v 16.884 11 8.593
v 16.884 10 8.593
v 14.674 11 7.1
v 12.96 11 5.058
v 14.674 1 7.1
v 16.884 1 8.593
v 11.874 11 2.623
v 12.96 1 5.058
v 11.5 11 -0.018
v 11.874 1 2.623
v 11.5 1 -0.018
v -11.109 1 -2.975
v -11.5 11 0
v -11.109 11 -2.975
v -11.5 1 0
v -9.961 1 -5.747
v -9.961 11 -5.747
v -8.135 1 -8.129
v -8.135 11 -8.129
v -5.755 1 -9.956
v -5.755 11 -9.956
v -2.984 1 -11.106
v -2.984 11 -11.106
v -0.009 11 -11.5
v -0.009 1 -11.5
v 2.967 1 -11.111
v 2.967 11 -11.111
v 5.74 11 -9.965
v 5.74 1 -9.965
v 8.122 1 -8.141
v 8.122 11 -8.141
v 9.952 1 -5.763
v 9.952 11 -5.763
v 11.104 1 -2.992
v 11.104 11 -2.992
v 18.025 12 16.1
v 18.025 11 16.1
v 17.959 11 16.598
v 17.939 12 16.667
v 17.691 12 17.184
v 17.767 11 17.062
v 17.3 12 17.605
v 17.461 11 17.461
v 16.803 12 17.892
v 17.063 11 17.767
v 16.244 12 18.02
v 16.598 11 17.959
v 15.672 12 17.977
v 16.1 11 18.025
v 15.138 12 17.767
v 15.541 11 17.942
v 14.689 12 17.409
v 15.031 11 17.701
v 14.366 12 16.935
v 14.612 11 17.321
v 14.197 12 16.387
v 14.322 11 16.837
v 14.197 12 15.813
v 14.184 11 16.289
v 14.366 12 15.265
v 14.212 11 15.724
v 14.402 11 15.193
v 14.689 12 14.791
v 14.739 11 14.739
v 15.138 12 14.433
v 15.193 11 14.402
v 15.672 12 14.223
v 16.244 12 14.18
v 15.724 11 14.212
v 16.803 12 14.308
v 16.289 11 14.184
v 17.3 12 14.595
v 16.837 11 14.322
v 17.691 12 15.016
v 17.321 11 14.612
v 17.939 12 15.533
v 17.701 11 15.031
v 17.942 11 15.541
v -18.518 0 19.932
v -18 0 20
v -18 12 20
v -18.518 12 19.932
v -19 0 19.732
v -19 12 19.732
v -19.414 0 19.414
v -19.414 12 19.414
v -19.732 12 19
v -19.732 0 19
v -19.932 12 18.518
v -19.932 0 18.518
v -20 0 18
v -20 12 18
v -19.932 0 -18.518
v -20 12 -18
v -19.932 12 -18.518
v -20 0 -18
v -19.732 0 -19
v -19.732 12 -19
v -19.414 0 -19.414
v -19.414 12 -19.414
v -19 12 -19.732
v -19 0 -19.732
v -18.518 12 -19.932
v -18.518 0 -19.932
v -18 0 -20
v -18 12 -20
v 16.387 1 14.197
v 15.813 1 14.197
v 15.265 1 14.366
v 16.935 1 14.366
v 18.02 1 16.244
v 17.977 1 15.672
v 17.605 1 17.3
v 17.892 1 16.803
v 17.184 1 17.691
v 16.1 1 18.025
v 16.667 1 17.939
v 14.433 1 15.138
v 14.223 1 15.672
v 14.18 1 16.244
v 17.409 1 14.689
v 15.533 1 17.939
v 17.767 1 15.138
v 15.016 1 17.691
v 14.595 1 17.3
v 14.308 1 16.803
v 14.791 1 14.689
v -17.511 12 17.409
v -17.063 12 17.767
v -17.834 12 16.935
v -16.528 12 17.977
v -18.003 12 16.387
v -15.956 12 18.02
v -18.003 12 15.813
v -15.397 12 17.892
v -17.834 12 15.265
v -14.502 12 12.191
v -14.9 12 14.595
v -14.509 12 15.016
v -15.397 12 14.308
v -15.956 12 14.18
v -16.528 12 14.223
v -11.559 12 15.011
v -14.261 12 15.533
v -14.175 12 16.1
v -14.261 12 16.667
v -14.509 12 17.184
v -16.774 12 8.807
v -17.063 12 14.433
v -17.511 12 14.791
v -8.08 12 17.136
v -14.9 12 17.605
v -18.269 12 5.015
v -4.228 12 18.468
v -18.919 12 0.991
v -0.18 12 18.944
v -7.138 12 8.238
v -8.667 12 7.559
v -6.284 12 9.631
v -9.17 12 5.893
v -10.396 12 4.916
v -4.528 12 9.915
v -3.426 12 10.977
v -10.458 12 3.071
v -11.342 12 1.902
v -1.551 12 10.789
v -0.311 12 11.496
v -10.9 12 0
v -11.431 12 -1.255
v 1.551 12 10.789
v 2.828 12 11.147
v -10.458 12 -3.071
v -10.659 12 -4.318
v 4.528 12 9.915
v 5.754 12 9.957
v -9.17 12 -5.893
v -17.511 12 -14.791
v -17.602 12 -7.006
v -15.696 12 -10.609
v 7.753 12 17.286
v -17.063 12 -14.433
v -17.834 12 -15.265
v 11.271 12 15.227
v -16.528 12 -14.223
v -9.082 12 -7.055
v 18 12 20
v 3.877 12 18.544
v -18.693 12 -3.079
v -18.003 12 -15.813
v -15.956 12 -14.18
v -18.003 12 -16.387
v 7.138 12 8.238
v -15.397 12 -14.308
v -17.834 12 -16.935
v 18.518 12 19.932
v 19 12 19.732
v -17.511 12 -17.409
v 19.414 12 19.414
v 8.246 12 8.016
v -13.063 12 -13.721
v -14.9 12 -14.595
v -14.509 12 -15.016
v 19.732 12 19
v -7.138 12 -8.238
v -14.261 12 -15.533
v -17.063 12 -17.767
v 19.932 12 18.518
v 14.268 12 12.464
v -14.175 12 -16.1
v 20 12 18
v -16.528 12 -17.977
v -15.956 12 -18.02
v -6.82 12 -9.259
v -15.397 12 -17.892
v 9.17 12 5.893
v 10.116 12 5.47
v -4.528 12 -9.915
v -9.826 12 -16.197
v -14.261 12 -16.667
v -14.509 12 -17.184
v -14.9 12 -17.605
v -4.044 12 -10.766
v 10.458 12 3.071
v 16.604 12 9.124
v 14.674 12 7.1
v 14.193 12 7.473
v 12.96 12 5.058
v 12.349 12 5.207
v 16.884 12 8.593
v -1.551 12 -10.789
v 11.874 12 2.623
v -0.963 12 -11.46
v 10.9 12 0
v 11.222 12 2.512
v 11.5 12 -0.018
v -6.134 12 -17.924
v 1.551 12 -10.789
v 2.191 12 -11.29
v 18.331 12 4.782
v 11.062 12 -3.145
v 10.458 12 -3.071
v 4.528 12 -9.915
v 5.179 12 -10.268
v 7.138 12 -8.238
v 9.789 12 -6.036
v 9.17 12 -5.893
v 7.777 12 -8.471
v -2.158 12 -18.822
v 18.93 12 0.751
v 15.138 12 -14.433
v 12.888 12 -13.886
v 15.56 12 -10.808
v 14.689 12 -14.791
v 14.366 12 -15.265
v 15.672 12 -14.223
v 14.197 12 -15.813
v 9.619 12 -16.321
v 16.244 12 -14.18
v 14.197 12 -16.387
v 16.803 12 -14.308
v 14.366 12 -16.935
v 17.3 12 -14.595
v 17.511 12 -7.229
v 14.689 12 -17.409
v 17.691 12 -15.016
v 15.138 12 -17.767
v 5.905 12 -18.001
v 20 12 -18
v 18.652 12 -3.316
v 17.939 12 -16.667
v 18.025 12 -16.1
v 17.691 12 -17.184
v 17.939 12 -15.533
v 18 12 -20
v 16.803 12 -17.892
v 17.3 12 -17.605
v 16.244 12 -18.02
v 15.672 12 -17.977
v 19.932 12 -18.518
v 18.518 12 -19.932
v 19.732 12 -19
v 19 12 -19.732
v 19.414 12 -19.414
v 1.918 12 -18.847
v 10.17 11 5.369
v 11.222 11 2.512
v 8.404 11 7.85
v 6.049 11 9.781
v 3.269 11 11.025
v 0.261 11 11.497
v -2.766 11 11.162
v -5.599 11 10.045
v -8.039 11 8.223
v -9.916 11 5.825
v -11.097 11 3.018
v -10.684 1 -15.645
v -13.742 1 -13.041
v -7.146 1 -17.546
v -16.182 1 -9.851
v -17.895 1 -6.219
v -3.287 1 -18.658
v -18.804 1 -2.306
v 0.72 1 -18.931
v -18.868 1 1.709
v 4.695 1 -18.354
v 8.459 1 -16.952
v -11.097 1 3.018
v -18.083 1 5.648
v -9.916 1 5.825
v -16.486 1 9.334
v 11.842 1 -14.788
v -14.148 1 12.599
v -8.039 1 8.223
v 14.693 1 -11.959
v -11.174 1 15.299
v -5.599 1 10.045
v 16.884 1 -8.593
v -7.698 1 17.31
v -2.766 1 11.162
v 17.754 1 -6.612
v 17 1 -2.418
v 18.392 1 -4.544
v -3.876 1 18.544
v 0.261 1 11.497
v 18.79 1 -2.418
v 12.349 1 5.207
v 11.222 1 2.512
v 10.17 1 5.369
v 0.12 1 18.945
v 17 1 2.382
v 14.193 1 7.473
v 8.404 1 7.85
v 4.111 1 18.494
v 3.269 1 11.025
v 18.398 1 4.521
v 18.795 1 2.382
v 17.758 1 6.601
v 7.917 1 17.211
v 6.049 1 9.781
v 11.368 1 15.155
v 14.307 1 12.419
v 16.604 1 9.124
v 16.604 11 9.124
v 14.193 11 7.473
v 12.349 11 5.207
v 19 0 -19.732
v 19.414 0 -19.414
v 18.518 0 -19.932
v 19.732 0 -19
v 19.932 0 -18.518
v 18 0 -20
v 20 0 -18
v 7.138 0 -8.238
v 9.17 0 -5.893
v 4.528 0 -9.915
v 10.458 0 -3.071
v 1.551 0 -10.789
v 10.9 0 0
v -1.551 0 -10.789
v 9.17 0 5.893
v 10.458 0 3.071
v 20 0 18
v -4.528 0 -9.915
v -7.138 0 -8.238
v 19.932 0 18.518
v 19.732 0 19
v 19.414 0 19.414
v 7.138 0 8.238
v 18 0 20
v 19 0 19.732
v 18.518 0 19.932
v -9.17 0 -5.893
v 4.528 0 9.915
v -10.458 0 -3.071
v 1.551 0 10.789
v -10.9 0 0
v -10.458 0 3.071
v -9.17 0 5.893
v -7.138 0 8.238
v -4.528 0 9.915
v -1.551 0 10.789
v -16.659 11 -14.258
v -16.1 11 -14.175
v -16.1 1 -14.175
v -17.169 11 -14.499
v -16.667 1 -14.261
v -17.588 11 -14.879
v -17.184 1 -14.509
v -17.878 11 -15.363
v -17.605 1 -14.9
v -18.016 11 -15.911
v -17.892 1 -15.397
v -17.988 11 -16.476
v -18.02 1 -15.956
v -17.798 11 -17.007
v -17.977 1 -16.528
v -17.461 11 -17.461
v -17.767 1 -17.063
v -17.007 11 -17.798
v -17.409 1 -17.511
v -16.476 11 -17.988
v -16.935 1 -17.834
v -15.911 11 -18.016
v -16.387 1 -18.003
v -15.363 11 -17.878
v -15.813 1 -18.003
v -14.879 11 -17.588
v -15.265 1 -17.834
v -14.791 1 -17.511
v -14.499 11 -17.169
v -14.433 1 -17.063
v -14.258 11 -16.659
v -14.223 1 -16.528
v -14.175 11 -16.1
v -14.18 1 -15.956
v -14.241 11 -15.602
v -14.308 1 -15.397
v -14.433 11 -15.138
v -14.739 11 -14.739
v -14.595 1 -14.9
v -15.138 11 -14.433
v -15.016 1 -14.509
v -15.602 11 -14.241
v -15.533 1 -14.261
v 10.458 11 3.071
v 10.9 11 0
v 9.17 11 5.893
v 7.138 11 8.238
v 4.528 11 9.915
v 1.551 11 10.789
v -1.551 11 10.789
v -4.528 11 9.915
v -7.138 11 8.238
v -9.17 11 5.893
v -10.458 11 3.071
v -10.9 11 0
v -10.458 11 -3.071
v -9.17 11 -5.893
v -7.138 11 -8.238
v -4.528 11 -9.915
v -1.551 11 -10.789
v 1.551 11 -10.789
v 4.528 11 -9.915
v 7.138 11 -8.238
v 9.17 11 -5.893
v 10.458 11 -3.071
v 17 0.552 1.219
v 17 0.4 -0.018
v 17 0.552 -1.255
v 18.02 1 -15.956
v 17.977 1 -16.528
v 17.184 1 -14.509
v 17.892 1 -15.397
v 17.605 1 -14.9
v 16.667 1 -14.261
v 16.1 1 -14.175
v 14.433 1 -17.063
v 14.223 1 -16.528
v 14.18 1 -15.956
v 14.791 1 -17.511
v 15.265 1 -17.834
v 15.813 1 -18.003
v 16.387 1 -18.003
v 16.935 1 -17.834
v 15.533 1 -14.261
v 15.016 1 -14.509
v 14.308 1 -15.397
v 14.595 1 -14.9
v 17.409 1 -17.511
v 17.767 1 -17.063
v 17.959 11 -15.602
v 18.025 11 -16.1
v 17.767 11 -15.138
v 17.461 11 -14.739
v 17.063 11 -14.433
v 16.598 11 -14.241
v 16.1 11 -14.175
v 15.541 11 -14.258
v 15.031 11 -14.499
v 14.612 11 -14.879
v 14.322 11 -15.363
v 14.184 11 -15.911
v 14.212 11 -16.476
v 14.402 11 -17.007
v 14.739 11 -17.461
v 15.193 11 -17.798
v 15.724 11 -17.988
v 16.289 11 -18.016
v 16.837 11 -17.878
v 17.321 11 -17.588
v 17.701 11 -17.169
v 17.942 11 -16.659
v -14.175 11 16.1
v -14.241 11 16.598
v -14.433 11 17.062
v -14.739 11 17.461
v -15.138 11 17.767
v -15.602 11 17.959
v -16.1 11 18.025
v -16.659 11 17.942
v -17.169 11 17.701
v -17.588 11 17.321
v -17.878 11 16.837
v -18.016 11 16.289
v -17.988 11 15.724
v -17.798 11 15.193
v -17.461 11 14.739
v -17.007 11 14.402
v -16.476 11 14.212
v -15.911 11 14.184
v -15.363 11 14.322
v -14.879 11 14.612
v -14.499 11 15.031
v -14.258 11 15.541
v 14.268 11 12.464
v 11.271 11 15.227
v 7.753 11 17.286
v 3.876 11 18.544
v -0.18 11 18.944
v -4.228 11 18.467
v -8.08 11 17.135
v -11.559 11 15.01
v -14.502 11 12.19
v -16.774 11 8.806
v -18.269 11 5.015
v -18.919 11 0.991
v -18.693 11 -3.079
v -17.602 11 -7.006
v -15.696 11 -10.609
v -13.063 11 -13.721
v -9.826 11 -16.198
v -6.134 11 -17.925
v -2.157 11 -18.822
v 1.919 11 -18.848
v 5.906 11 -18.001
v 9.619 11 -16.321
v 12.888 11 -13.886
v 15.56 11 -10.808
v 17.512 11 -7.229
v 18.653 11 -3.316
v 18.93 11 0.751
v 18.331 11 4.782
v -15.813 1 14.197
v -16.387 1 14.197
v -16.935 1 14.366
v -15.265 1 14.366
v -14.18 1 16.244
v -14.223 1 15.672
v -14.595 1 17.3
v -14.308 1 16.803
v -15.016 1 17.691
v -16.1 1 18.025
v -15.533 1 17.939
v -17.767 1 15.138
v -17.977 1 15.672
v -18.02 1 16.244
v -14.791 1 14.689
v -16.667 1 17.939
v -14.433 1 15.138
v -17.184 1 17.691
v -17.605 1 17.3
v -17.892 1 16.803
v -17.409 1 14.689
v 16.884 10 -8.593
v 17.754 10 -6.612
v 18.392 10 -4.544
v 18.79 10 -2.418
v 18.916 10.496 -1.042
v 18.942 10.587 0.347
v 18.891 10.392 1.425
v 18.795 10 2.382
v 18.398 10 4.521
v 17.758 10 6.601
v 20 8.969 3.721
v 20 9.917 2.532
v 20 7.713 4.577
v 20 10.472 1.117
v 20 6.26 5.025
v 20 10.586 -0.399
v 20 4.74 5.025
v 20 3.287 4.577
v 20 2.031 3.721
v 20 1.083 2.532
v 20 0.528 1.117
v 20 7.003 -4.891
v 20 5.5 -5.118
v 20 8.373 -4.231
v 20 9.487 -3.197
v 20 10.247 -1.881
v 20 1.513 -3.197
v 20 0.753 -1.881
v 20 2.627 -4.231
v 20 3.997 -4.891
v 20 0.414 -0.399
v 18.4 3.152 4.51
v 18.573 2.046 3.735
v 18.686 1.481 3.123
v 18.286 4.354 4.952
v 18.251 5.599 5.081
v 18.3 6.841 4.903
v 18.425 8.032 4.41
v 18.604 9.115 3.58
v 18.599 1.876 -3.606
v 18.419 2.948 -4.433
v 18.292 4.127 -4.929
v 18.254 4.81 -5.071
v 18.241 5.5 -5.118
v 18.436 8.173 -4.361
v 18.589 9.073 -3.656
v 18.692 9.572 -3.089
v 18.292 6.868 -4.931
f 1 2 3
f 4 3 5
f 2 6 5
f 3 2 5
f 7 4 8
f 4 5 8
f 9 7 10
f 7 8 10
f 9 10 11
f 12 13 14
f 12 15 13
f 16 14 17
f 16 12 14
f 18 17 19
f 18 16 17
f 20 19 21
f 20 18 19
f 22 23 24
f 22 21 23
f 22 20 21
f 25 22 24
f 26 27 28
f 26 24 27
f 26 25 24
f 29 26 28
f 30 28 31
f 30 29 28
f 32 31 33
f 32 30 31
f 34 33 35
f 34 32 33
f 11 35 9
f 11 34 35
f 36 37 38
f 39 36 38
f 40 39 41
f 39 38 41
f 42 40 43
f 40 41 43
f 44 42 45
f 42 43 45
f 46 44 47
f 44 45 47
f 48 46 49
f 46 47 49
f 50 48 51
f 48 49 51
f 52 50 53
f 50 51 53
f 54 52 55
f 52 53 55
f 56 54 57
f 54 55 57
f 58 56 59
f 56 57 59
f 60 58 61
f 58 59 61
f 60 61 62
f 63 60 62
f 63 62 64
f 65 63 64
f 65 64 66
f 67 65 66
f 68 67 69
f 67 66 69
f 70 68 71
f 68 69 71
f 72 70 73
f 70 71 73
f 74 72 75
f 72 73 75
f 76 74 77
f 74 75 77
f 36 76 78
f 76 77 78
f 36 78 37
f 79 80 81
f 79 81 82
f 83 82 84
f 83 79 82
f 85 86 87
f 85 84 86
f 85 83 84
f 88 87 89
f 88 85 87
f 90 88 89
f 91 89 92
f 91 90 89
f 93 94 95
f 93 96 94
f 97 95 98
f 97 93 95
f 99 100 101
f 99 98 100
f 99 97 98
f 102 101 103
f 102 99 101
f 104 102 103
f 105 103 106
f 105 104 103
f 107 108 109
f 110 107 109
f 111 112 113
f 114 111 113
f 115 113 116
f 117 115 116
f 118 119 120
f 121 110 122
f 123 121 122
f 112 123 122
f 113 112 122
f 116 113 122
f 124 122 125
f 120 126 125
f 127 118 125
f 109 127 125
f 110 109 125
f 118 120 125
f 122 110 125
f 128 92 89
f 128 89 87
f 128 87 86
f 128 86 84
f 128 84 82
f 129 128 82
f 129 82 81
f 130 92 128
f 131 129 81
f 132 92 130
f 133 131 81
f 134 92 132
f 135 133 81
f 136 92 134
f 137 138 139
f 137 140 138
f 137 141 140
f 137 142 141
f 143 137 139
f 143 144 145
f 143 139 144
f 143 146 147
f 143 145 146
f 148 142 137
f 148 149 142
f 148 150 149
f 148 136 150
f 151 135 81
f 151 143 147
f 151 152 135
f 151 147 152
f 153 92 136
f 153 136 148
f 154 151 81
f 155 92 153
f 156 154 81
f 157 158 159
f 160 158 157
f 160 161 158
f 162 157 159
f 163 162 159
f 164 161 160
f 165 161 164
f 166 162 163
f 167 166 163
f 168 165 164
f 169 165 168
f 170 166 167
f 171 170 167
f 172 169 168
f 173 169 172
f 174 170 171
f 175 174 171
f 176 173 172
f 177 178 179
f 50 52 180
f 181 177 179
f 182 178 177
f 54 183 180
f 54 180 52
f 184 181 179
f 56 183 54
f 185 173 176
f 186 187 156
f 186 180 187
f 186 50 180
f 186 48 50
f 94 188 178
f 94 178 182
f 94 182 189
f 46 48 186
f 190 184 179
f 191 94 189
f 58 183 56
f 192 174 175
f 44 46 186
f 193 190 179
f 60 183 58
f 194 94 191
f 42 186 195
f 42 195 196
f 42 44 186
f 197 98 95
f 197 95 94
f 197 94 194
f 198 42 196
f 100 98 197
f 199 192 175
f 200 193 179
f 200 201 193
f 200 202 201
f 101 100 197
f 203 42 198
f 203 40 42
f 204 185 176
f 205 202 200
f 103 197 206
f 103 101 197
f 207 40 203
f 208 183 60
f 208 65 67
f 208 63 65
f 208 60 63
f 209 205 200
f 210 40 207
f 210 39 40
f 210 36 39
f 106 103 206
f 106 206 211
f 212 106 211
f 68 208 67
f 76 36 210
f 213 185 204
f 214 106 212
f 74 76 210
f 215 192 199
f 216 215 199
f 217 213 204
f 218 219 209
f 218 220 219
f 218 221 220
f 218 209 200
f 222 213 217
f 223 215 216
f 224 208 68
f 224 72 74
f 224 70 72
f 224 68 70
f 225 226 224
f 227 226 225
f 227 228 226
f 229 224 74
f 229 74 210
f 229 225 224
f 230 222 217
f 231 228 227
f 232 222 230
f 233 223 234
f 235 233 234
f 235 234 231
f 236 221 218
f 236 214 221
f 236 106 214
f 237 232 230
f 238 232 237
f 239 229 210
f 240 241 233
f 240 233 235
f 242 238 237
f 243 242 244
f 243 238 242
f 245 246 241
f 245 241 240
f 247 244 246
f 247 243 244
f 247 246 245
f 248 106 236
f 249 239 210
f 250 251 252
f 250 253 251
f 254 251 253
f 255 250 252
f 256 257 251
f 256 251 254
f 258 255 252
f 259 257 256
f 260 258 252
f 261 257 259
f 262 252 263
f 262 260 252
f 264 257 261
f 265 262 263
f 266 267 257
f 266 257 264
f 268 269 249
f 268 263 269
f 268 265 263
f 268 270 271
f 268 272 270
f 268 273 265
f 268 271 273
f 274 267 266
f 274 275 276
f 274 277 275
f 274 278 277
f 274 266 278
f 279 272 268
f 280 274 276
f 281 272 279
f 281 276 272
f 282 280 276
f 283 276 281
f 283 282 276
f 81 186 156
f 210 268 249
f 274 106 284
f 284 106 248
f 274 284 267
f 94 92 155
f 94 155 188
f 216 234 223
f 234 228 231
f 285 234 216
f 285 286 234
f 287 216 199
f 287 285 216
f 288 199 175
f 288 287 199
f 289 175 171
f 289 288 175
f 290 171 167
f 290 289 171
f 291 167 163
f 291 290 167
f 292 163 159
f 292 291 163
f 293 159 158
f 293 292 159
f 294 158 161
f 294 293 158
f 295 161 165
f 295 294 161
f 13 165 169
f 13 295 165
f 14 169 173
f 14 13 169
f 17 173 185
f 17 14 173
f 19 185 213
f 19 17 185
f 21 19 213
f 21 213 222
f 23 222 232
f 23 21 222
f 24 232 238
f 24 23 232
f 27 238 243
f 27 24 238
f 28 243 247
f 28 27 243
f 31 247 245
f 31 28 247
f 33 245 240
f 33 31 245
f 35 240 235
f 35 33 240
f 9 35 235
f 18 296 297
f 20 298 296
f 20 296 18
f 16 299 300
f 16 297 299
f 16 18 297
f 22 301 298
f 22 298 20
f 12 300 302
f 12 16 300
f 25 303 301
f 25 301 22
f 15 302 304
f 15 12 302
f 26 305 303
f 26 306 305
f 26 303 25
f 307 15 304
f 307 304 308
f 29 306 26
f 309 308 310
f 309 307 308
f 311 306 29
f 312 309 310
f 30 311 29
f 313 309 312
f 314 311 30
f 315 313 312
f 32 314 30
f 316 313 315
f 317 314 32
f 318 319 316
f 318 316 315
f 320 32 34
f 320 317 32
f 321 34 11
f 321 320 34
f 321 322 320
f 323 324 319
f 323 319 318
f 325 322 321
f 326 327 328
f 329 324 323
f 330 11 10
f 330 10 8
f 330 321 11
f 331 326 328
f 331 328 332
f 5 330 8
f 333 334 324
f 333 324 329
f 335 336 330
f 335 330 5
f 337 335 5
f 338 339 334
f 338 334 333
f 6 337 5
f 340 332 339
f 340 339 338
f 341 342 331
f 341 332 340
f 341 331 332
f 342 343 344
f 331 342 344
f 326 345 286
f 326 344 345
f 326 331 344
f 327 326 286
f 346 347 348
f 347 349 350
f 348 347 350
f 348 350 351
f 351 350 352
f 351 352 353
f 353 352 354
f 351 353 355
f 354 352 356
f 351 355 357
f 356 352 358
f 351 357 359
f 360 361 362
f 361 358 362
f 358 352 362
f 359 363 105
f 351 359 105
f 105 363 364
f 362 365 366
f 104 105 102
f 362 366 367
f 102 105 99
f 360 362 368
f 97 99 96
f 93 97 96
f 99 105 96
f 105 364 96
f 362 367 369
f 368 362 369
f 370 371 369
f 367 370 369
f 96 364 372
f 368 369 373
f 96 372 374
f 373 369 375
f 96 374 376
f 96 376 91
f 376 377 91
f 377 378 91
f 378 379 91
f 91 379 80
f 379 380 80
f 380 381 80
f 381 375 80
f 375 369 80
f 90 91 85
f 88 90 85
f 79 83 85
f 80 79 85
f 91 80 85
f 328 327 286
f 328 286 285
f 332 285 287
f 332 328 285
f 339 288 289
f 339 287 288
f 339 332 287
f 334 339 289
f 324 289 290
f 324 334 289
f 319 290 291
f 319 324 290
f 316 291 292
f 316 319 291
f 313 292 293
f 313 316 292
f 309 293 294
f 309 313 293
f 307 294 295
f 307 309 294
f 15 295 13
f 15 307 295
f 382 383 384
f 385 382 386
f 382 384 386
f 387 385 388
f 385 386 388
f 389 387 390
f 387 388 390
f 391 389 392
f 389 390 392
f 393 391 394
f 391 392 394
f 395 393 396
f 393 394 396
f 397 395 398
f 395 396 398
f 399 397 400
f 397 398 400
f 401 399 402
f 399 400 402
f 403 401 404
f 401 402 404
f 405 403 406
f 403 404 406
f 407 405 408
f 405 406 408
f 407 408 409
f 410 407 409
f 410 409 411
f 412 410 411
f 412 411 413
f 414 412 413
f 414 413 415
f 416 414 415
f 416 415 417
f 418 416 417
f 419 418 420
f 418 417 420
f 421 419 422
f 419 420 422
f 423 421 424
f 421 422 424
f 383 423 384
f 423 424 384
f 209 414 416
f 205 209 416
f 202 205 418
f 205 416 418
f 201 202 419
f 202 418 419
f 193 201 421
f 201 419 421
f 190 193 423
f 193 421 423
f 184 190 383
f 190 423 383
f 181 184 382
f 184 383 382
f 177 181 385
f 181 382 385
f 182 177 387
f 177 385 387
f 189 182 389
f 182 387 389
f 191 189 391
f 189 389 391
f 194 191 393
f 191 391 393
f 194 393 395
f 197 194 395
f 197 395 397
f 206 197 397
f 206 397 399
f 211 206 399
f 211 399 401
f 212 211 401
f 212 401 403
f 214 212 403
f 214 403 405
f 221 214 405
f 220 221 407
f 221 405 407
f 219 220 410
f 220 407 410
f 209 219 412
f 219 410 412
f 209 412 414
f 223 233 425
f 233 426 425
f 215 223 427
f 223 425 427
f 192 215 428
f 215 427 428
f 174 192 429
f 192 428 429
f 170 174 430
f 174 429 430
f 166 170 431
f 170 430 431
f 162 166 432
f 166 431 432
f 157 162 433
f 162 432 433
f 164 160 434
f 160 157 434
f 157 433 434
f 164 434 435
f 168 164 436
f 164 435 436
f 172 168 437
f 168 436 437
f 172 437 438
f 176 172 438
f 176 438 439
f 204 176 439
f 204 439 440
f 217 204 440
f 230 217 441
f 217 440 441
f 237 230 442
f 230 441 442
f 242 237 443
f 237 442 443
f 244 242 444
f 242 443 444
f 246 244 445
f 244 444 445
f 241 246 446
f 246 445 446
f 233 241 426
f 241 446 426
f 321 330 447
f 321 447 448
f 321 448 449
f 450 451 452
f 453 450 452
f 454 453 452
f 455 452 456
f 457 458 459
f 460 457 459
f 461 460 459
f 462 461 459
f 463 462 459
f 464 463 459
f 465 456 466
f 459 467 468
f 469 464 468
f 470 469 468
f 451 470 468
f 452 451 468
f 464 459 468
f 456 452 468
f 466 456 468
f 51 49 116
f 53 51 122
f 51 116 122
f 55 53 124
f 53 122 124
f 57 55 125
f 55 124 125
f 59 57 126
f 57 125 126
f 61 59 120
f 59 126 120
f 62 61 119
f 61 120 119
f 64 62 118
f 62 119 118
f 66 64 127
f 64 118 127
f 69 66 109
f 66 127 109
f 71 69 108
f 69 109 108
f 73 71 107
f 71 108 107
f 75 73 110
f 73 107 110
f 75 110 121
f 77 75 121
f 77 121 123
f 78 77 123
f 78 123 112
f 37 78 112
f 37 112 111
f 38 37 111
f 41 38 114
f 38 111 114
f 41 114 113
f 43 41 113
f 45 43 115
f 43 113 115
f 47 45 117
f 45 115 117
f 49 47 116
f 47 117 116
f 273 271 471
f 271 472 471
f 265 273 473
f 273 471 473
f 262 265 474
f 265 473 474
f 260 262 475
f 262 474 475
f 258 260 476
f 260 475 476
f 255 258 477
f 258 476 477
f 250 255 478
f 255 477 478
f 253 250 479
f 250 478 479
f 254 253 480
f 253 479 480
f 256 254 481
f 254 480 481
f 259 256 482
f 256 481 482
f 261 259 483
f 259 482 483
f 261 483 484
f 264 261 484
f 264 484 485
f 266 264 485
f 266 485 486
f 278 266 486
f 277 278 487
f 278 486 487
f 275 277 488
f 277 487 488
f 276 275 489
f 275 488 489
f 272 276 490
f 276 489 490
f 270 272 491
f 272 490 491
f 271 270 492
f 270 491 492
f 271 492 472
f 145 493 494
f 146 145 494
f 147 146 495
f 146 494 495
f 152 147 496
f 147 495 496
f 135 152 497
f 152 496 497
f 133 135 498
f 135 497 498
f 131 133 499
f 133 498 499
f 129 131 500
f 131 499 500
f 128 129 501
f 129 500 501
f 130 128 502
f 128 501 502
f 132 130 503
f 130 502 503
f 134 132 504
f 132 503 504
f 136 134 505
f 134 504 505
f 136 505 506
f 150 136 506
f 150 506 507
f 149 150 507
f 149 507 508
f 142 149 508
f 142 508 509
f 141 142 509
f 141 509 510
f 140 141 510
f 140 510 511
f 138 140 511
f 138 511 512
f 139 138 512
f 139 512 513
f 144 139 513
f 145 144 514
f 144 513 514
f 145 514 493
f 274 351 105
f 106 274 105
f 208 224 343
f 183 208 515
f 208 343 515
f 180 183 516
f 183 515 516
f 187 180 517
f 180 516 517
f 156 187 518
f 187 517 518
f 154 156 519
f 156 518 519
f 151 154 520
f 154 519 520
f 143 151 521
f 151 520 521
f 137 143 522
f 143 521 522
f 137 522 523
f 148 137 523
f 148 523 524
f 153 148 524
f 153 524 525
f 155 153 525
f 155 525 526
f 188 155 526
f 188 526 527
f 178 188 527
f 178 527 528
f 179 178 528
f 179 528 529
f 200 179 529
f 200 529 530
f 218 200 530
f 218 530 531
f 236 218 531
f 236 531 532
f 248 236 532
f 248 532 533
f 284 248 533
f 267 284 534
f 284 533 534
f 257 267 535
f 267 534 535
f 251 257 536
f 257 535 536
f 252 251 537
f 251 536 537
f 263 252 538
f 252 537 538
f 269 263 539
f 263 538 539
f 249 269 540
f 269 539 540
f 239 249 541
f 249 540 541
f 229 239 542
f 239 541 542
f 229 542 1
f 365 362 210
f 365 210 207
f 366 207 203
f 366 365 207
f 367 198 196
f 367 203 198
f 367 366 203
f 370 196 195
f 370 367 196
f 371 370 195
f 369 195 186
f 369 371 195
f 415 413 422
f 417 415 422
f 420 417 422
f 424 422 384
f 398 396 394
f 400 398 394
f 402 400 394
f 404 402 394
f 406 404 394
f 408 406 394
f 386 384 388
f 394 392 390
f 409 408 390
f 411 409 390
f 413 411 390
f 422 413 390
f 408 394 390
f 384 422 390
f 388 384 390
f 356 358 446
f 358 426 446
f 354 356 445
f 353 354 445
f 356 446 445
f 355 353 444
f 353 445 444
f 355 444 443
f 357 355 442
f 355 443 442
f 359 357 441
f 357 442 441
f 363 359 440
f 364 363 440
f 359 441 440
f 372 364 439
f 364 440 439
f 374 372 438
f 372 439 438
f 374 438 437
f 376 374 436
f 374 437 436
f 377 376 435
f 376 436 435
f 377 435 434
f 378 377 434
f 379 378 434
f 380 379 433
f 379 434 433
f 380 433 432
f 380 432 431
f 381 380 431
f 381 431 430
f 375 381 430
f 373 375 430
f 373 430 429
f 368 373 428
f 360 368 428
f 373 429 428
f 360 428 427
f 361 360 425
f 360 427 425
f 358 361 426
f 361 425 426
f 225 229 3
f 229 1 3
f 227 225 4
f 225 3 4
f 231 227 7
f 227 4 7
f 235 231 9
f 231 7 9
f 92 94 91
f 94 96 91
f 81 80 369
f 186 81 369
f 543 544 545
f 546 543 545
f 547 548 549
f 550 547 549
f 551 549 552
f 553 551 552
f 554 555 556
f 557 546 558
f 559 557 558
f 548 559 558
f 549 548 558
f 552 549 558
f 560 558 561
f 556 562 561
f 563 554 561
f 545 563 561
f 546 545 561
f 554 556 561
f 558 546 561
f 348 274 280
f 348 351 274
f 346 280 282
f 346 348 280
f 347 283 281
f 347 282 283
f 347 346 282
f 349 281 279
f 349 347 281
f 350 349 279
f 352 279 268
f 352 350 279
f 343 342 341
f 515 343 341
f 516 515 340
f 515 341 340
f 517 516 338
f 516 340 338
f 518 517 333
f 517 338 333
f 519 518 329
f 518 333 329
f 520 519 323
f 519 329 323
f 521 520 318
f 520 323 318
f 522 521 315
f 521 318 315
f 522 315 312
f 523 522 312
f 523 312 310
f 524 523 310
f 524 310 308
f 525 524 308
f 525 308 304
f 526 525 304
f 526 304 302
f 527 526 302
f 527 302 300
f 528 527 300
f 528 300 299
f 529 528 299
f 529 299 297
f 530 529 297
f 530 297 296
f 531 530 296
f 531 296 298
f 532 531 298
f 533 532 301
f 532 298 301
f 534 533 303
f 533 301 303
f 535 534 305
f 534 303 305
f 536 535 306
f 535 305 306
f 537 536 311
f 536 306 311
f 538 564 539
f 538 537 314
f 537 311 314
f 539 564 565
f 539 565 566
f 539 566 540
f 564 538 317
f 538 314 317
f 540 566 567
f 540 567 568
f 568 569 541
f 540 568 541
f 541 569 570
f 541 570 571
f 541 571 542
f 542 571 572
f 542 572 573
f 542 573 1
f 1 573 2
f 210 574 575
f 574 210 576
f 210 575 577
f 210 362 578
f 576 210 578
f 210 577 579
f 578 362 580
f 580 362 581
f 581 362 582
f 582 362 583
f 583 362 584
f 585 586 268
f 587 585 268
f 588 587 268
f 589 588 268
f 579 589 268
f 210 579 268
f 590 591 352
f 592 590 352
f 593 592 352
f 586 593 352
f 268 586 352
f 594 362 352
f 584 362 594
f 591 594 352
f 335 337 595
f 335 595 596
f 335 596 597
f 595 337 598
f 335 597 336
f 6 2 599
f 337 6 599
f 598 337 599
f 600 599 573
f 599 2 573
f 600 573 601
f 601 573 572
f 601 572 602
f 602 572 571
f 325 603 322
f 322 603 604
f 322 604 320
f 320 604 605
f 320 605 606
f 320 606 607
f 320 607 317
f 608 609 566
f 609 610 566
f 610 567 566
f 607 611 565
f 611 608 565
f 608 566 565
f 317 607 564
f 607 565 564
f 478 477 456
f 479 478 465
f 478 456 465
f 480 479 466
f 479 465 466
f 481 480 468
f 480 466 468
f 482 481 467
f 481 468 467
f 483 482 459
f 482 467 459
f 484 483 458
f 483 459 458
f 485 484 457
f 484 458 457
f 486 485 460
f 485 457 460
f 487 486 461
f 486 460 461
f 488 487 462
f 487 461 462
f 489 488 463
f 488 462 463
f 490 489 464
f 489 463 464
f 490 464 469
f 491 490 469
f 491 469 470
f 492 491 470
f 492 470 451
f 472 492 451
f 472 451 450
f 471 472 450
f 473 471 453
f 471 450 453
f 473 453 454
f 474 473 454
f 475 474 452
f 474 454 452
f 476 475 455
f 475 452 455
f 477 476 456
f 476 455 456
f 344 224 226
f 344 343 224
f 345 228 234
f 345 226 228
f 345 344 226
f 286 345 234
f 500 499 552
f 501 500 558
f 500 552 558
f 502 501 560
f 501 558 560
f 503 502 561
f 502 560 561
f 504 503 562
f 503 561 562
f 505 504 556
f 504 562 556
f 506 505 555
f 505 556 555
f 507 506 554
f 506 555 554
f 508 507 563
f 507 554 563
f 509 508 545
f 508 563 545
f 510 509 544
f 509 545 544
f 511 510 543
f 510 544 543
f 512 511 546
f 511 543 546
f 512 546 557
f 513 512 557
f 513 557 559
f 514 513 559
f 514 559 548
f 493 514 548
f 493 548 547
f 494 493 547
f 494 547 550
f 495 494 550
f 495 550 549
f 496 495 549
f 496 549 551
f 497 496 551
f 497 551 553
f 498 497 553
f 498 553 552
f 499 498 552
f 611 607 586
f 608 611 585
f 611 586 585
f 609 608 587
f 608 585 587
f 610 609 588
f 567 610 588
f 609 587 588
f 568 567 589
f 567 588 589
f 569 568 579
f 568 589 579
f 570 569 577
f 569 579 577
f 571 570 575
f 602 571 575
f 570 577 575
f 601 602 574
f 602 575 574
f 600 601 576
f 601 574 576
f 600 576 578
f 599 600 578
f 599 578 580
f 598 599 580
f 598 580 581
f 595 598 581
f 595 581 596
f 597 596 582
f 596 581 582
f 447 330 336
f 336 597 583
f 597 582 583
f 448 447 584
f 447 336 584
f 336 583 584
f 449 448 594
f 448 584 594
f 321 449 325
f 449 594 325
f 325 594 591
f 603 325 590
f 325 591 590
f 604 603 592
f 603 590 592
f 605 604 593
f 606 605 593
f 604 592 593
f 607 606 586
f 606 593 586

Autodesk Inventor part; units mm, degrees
ref_plane "YZ Plane" through (0, 0, 0) normal (1, 0, 0) x (0, 1, 0)
ref_plane "XZ Plane" through (0, 0, 0) normal (0, 1, 0) x (-1, 0, 0)
ref_plane "XY Plane" through (0, 0, 0) normal (0, 0, 1) x (1, 0, 0)
sketch "Sketch1" plane through (0, 0, 0) normal (0, 1, 0) x (-1, 0, 0)
  line L0 (18, 20) -> (-18, 20)
  line L1 (-20, 18) -> (-20, -18)
  line L2 (-18, -20) -> (18, -20)
  line L3 (20, -18) -> (20, 18)
  line L4 (20, 20) -> (-20, -20) construction
  line L5 (-20, 20) -> (20, -20) construction
  circle A0 centre (0, 0) radius 11.5
  circle A1 centre (0, 0) radius 18.945
  arc A2 (20, 18) -> (18, 20) centre (18, 18) ccw
  arc A3 (18, -20) -> (20, -18) centre (18, -18) ccw
  arc A4 (-20, -18) -> (-18, -20) centre (-18, -18) ccw
  arc A5 (-18, 20) -> (-20, 18) centre (-18, 18) ccw
  dimension "d0" = 40
  dimension "d1" = 40
  dimension "d2" = 23
  dimension "d3" = 37.89
  dimension "d4" = 2
extrude "Extrusion1" add sketch "Sketch1" along normal blind 11
sketch "Sketch2" plane through (0, 0, 0) normal (0, -1, 0) x (1, 0, 0)
  line L0 (-20, -18) -> (-20, 18) projected
  arc A0 (-18, 20) -> (-20, 18) centre (-18, 18) ccw projected
  line L1 (-18, 20) -> (18, 20) projected
  arc A1 (20, 18) -> (18, 20) centre (18, 18) ccw projected
  line L2 (20, 18) -> (20, -18) projected
  arc A2 (18, -20) -> (20, -18) centre (18, -18) ccw projected
  line L3 (18, -20) -> (-18, -20) projected
  arc A3 (-20, -18) -> (-18, -20) centre (-18, -18) ccw projected
  point P0 (0, 0)
extrude "Extrusion2" add sketch "Sketch2" against normal blind 1
sketch "Sketch3" plane through (0, 11, 0) normal (0, 1, 0) x (1, 0, 0)
  circle A0 centre (0, 0) radius 11.5 projected
  circle A1 centre (0, 0) radius 10.9
  dimension "d9" = 0.6
extrude "Extrusion3" cut sketch "Sketch3" against normal through all contours A1
sketch "Sketch4" plane through (0, 11, 0) normal (0, 1, 0) x (1, 0, 0)
  circle A0 centre (0, 0) radius 18.945 construction
  line L0 (-18, -20) -> (18, -20) construction
  arc A1 (18, -20) -> (20, -18) centre (18, -18) ccw construction
  line L1 (20, -18) -> (20, 18) construction
  arc A2 (20, 18) -> (18, 20) centre (18, 18) ccw construction
  line L2 (18, 20) -> (-18, 20) construction
  arc A3 (-18, 20) -> (-20, 18) centre (-18, 18) ccw construction
  line L3 (-20, 18) -> (-20, -18) construction
  arc A4 (-20, -18) -> (-18, -20) centre (-18, -18) ccw construction
  line L4 (-16.1, -16.1) -> (16.1, -16.1) construction
  line L5 (16.1, -16.1) -> (16.1, 16.1) construction
  line L6 (16.1, 16.1) -> (-16.1, 16.1) construction
  line L7 (-16.1, 16.1) -> (-16.1, -16.1) construction
  line L8 (-16.1, -16.1) -> (16.1, 16.1) construction
  line L9 (16.1, -16.1) -> (-16.1, 16.1) construction
  point P0 (0, 0)
  dimension "d12" = 32.2
  dimension "d13" = 32.2
hole "Hole1" at (-16.1, 11, 16.1) at (-16.1, 11, -16.1) at (16.1, 11, -16.1) at (16.1, 11, 16.1) direction (0, -1, 0) diameter 3.85 depth 10
sketch "Sketch14" plane through (20, 0, -18) normal (1, 0, 0) x (0, 0, -1)
  line L0 (0, 0) -> (0, 11) construction
  line L1 (-36, 11) -> (0, 11) construction
  line L2 (-36, 0) -> (-36, 11) construction
  line L3 (-36, 0) -> (0, 0) construction
  line L4 (-25.5, 10) -> (-10.5, 10)
  line L5 (-10.5, 10) -> (-10.5, 1)
  line L6 (-10.5, 1) -> (-25.5, 1)
  line L7 (-25.5, 1) -> (-25.5, 10)
  line L8 (-25.5, 10) -> (-10.5, 1) construction
  line L9 (-10.5, 10) -> (-25.5, 1) construction
  point P0 (-18, 0)
  point P1 (-18, 5.5)
  dimension "d47" = 15
  dimension "d48" = 9
extrude "Extrusion12" cut sketch "Sketch14" against normal blind 3
fillet "Fillet2" radius 2 2 edges at (17.3972, 5.5, 7.5) (17.3972, 5.5, -7.5)
sketch "Sketch15" plane through (0, 1, 0) normal (0, 1, 0) x (1, 0, 0)
  arc A0 (18.6666, -7.5) -> (16.8842, -8.5929) centre (18.6666, -9.5) ccw construction
  line L0 (20, -7.5) -> (18.6666, -7.5) construction
  line L1 (20, 7.5) -> (20, -7.5) construction
  line L2 (20, 7.5) -> (18.6666, 7.5) construction
  arc A1 (16.8842, 8.5929) -> (18.6666, 7.5) centre (18.6666, 9.5) ccw construction
  arc A2 (16.6035, -9.1235) -> (16.8842, -8.5929) centre (0, 0) ccw
  arc A3 (11.2223, -2.5118) -> (11.5, 0.0176) centre (0, 0) ccw
  arc A4 (11.5, 0.0176) -> (16.8842, -8.5929) centre (21.1006, 0.0323) ccw
  arc A5 (10.9, 0.0167) -> (16.6207, -9.1319) centre (21.1006, 0.0323) ccw
  dimension "d52" = 0.6
extrude "Extrusion13" add sketch "Sketch15" along normal up to surface (10 mm away)
sketch "Sketch16" plane through (20, 10, -7.5) normal (0, -1, 0) x (1, 0, 0)
  arc A0 (-3.1158, -1.0929) -> (-3.1158, 16.0929) centre (-20, 7.5) ccw projected
  arc A1 (-1.3334, 0) -> (-3.1158, -1.0929) centre (-1.3334, -2) ccw projected
  line L0 (0, 0) -> (-1.3334, 0) projected
  line L1 (0, 15) -> (0, 0) projected
  line L2 (0, 15) -> (-1.3334, 15) projected
  arc A2 (-3.1158, 16.0929) -> (-1.3334, 15) centre (-1.3334, 17) ccw projected
extrude "Extrusion14" add sketch "Sketch16" along normal up to surface (9 mm away)
sketch "Sketch17" plane through (20, 0, -18) normal (1, 0, 0) x (0, 0, -1)
  line L0 (0, 0) -> (0, 11) construction
  line L1 (-36, 11) -> (0, 11) construction
  line L2 (-36, 0) -> (-36, 11) construction
  line L3 (-36, 0) -> (0, 0) construction
  circle A0 centre (-17.9824, 5.5) radius 5.1
  point P0 (-18, 0)
  dimension "d57" = 10.2
extrude "Extrusion15" cut sketch "Sketch17" against normal blind 3
sketch "Sketch18" plane through (0, 11, 0) normal (0, 1, 0) x (1, 0, 0)
  line L0 (-18, -20) -> (18, -20) projected
  arc A0 (18, -20) -> (20, -18) centre (18, -18) ccw projected
  line L1 (20, -18) -> (20, 18) projected
  arc A1 (20, 18) -> (18, 20) centre (18, 18) ccw projected
  line L2 (18, 20) -> (-18, 20) projected
  arc A2 (-18, 20) -> (-20, 18) centre (-18, 18) ccw projected
  line L3 (-20, 18) -> (-20, -18) projected
  arc A3 (-20, -18) -> (-18, -20) centre (-18, -18) ccw projected
  circle A4 centre (16.1, -16.1) radius 1.925 projected
  circle A5 centre (-16.1, 16.1) radius 1.925 projected
  circle A6 centre (-16.1, -16.1) radius 1.925 projected
  circle A7 centre (16.1, 16.1) radius 1.925 projected
  circle A8 centre (0, 0) radius 10.9 projected
  arc A9 (11.5, 0.0176) -> (11.2223, -2.5118) centre (0, 0) ccw projected
  arc A10 (11.2223, -2.5118) -> (16.6035, -9.1235) centre (21.1006, 0.0323) ccw projected
  arc A11 (16.8842, -8.5929) -> (16.6035, -9.1235) centre (0, 0) ccw projected
  arc A12 (11.5, 0.0176) -> (16.8842, -8.5929) centre (21.1006, 0.0323) ccw projected
extrude "Extrusion16" add sketch "Sketch18" along normal blind 1
sketch "Sketch19" plane through (0, 0, 0) normal (0, 1, 0) x (-1, 0, 0)
  arc A0 (-11.2223, 2.5118) -> (-16.6035, 9.1235) centre (-21.1006, -0.0323) ccw construction
  arc A1 (-16.8842, 8.5929) -> (-16.6035, 9.1235) centre (0, 0) ccw construction
  arc A2 (-11.5, -0.0176) -> (-16.8842, 8.5929) centre (-21.1006, -0.0323) ccw construction
  arc A3 (-11.5, -0.0176) -> (-11.2223, 2.5118) centre (0, 0) ccw construction
  circle A4 centre (0, 0) radius 10.9 construction
  circle A5 centre (-16.1, -16.1) radius 1.925 construction
  circle A6 centre (16.1, 16.1) radius 1.925 construction
  circle A7 centre (16.1, -16.1) radius 1.925 construction
  circle A8 centre (-16.1, 16.1) radius 1.925 construction
  line L0 (18, 20) -> (-18, 20) construction
  arc A9 (-18, 20) -> (-20, 18) centre (-18, 18) ccw construction
  line L1 (-20, 18) -> (-20, -18) construction
  arc A10 (-20, -18) -> (-18, -20) centre (-18, -18) ccw construction
  line L2 (-18, -20) -> (18, -20) construction
  arc A11 (18, -20) -> (20, -18) centre (18, -18) ccw construction
  line L3 (20, -18) -> (20, 18) construction
  arc A12 (20, 18) -> (18, 20) centre (18, 18) ccw construction
sketch "Sketch5" plane through (20, 0, -18) normal (1, 0, 0) x (0, 0, -1)
  line L0 (0, 0) -> (0, 11) construction
  line L1 (-36, 11) -> (0, 11) construction
  line L2 (-36, 0) -> (-36, 11) construction
  line L3 (-36, 0) -> (0, 0) construction
  line L4 (-20.5, 10) -> (-5.5, 10)
  line L5 (-5.5, 10) -> (-5.5, 1)
  line L6 (-5.5, 1) -> (-20.5, 1)
  line L7 (-20.5, 1) -> (-20.5, 10)
  line L8 (-20.5, 10) -> (-5.5, 1) construction
  line L9 (-5.5, 10) -> (-20.5, 1) construction
  point P0 (-18, 0)
  point P1 (-13, 5.5)
  dimension "d21" = 15
  dimension "d22" = 9
sketch "Sketch6" plane through (0, 1, 0) normal (0, 1, 0) x (1, 0, 0)
  line L0 (20, -2.5) -> (18.7339, -2.5) construction
  arc A0 (15.4996, 2.2947) -> (15.8884, 4.3911) centre (6.7587, 5) ccw
  arc A1 (15.8884, 4.3911) -> (18.7339, -2.5) centre (25.6093, 4.3721) ccw
  arc A2 (15.4996, 2.2947) -> (18.3979, -3.0115) centre (25.6093, 4.3721) ccw
  arc A3 (18.3979, -3.0115) -> (18.7339, -2.5) centre (6.7587, 5) ccw
  arc A4 (18.3979, -3.0115) -> (18.7339, -2.5) centre (6.7587, 5) ccw
  point P0 (0, 0)
  dimension "d25" = 0.6
sketch "Sketch12" plane through (20, 10, -12.5) normal (0, -1, 0) x (1, 0, 0)
  arc A0 (-4, 2.4397) -> (-1.2661, 15) centre (-20, 12.5) ccw projected
  line L0 (0, 0) -> (-4, 0) projected
  line L1 (0, 15) -> (0, 0) projected
  line L2 (0, 15) -> (-1.2661, 15) projected
  line L3 (-4, 2.4397) -> (-4, 0) projected
sketch "Sketch13" plane through (20, 0, -18) normal (1, 0, 0) x (0, 0, -1)
  line L0 (0, 0) -> (0, 11) construction
  line L1 (-36, 11) -> (0, 11) construction
  line L2 (-36, 0) -> (-36, 11) construction
  line L3 (-36, 0) -> (0, 0) construction
  circle A0 centre (-13, 5.5) radius 5.1
  point P0 (-18, 0)
  dimension "d44" = 10.2
sketch "Sketch8" plane through (20, 0, -13) normal (1, 0, 0) x (0, 0, -1)
  line L0 (-20.5, 10) -> (-5.5, 10) projected
  line L1 (-20.5, 1) -> (-20.5, 10) projected
  line L2 (-5.5, 1) -> (-20.5, 1) projected
  line L3 (-5.5, 10) -> (-5.5, 1) projected
  line L4 (-20.3, 9.8) -> (-5.7, 9.8)
  line L5 (-5.7, 9.8) -> (-5.7, 1.2)
  line L6 (-5.7, 1.2) -> (-20.3, 1.2)
  line L7 (-20.3, 1.2) -> (-20.3, 9.8)
  point P0 (-13, 0)
  dimension "d30" = 0.2
  dimension "d33" = 1
  dimension "d34" = 0.6
sketch "Sketch11" plane through (22.6, 0, -13) normal (1, 0, 0) x (0, 0, -1)
  line L0 (-21.3, 10.8) -> (-21.3, 0.2) construction
  line L1 (-21.3, 0.2) -> (-4.7, 0.2) construction
  line L2 (-4.7, 0.2) -> (-4.7, 10.8) construction
  line L3 (-4.7, 10.8) -> (-21.3, 10.8) construction
  circle A0 centre (-13, 5.5) radius 5.125
  point P0 (-13, 0)
  dimension "d39" = 10.25
properties part number "base3"
